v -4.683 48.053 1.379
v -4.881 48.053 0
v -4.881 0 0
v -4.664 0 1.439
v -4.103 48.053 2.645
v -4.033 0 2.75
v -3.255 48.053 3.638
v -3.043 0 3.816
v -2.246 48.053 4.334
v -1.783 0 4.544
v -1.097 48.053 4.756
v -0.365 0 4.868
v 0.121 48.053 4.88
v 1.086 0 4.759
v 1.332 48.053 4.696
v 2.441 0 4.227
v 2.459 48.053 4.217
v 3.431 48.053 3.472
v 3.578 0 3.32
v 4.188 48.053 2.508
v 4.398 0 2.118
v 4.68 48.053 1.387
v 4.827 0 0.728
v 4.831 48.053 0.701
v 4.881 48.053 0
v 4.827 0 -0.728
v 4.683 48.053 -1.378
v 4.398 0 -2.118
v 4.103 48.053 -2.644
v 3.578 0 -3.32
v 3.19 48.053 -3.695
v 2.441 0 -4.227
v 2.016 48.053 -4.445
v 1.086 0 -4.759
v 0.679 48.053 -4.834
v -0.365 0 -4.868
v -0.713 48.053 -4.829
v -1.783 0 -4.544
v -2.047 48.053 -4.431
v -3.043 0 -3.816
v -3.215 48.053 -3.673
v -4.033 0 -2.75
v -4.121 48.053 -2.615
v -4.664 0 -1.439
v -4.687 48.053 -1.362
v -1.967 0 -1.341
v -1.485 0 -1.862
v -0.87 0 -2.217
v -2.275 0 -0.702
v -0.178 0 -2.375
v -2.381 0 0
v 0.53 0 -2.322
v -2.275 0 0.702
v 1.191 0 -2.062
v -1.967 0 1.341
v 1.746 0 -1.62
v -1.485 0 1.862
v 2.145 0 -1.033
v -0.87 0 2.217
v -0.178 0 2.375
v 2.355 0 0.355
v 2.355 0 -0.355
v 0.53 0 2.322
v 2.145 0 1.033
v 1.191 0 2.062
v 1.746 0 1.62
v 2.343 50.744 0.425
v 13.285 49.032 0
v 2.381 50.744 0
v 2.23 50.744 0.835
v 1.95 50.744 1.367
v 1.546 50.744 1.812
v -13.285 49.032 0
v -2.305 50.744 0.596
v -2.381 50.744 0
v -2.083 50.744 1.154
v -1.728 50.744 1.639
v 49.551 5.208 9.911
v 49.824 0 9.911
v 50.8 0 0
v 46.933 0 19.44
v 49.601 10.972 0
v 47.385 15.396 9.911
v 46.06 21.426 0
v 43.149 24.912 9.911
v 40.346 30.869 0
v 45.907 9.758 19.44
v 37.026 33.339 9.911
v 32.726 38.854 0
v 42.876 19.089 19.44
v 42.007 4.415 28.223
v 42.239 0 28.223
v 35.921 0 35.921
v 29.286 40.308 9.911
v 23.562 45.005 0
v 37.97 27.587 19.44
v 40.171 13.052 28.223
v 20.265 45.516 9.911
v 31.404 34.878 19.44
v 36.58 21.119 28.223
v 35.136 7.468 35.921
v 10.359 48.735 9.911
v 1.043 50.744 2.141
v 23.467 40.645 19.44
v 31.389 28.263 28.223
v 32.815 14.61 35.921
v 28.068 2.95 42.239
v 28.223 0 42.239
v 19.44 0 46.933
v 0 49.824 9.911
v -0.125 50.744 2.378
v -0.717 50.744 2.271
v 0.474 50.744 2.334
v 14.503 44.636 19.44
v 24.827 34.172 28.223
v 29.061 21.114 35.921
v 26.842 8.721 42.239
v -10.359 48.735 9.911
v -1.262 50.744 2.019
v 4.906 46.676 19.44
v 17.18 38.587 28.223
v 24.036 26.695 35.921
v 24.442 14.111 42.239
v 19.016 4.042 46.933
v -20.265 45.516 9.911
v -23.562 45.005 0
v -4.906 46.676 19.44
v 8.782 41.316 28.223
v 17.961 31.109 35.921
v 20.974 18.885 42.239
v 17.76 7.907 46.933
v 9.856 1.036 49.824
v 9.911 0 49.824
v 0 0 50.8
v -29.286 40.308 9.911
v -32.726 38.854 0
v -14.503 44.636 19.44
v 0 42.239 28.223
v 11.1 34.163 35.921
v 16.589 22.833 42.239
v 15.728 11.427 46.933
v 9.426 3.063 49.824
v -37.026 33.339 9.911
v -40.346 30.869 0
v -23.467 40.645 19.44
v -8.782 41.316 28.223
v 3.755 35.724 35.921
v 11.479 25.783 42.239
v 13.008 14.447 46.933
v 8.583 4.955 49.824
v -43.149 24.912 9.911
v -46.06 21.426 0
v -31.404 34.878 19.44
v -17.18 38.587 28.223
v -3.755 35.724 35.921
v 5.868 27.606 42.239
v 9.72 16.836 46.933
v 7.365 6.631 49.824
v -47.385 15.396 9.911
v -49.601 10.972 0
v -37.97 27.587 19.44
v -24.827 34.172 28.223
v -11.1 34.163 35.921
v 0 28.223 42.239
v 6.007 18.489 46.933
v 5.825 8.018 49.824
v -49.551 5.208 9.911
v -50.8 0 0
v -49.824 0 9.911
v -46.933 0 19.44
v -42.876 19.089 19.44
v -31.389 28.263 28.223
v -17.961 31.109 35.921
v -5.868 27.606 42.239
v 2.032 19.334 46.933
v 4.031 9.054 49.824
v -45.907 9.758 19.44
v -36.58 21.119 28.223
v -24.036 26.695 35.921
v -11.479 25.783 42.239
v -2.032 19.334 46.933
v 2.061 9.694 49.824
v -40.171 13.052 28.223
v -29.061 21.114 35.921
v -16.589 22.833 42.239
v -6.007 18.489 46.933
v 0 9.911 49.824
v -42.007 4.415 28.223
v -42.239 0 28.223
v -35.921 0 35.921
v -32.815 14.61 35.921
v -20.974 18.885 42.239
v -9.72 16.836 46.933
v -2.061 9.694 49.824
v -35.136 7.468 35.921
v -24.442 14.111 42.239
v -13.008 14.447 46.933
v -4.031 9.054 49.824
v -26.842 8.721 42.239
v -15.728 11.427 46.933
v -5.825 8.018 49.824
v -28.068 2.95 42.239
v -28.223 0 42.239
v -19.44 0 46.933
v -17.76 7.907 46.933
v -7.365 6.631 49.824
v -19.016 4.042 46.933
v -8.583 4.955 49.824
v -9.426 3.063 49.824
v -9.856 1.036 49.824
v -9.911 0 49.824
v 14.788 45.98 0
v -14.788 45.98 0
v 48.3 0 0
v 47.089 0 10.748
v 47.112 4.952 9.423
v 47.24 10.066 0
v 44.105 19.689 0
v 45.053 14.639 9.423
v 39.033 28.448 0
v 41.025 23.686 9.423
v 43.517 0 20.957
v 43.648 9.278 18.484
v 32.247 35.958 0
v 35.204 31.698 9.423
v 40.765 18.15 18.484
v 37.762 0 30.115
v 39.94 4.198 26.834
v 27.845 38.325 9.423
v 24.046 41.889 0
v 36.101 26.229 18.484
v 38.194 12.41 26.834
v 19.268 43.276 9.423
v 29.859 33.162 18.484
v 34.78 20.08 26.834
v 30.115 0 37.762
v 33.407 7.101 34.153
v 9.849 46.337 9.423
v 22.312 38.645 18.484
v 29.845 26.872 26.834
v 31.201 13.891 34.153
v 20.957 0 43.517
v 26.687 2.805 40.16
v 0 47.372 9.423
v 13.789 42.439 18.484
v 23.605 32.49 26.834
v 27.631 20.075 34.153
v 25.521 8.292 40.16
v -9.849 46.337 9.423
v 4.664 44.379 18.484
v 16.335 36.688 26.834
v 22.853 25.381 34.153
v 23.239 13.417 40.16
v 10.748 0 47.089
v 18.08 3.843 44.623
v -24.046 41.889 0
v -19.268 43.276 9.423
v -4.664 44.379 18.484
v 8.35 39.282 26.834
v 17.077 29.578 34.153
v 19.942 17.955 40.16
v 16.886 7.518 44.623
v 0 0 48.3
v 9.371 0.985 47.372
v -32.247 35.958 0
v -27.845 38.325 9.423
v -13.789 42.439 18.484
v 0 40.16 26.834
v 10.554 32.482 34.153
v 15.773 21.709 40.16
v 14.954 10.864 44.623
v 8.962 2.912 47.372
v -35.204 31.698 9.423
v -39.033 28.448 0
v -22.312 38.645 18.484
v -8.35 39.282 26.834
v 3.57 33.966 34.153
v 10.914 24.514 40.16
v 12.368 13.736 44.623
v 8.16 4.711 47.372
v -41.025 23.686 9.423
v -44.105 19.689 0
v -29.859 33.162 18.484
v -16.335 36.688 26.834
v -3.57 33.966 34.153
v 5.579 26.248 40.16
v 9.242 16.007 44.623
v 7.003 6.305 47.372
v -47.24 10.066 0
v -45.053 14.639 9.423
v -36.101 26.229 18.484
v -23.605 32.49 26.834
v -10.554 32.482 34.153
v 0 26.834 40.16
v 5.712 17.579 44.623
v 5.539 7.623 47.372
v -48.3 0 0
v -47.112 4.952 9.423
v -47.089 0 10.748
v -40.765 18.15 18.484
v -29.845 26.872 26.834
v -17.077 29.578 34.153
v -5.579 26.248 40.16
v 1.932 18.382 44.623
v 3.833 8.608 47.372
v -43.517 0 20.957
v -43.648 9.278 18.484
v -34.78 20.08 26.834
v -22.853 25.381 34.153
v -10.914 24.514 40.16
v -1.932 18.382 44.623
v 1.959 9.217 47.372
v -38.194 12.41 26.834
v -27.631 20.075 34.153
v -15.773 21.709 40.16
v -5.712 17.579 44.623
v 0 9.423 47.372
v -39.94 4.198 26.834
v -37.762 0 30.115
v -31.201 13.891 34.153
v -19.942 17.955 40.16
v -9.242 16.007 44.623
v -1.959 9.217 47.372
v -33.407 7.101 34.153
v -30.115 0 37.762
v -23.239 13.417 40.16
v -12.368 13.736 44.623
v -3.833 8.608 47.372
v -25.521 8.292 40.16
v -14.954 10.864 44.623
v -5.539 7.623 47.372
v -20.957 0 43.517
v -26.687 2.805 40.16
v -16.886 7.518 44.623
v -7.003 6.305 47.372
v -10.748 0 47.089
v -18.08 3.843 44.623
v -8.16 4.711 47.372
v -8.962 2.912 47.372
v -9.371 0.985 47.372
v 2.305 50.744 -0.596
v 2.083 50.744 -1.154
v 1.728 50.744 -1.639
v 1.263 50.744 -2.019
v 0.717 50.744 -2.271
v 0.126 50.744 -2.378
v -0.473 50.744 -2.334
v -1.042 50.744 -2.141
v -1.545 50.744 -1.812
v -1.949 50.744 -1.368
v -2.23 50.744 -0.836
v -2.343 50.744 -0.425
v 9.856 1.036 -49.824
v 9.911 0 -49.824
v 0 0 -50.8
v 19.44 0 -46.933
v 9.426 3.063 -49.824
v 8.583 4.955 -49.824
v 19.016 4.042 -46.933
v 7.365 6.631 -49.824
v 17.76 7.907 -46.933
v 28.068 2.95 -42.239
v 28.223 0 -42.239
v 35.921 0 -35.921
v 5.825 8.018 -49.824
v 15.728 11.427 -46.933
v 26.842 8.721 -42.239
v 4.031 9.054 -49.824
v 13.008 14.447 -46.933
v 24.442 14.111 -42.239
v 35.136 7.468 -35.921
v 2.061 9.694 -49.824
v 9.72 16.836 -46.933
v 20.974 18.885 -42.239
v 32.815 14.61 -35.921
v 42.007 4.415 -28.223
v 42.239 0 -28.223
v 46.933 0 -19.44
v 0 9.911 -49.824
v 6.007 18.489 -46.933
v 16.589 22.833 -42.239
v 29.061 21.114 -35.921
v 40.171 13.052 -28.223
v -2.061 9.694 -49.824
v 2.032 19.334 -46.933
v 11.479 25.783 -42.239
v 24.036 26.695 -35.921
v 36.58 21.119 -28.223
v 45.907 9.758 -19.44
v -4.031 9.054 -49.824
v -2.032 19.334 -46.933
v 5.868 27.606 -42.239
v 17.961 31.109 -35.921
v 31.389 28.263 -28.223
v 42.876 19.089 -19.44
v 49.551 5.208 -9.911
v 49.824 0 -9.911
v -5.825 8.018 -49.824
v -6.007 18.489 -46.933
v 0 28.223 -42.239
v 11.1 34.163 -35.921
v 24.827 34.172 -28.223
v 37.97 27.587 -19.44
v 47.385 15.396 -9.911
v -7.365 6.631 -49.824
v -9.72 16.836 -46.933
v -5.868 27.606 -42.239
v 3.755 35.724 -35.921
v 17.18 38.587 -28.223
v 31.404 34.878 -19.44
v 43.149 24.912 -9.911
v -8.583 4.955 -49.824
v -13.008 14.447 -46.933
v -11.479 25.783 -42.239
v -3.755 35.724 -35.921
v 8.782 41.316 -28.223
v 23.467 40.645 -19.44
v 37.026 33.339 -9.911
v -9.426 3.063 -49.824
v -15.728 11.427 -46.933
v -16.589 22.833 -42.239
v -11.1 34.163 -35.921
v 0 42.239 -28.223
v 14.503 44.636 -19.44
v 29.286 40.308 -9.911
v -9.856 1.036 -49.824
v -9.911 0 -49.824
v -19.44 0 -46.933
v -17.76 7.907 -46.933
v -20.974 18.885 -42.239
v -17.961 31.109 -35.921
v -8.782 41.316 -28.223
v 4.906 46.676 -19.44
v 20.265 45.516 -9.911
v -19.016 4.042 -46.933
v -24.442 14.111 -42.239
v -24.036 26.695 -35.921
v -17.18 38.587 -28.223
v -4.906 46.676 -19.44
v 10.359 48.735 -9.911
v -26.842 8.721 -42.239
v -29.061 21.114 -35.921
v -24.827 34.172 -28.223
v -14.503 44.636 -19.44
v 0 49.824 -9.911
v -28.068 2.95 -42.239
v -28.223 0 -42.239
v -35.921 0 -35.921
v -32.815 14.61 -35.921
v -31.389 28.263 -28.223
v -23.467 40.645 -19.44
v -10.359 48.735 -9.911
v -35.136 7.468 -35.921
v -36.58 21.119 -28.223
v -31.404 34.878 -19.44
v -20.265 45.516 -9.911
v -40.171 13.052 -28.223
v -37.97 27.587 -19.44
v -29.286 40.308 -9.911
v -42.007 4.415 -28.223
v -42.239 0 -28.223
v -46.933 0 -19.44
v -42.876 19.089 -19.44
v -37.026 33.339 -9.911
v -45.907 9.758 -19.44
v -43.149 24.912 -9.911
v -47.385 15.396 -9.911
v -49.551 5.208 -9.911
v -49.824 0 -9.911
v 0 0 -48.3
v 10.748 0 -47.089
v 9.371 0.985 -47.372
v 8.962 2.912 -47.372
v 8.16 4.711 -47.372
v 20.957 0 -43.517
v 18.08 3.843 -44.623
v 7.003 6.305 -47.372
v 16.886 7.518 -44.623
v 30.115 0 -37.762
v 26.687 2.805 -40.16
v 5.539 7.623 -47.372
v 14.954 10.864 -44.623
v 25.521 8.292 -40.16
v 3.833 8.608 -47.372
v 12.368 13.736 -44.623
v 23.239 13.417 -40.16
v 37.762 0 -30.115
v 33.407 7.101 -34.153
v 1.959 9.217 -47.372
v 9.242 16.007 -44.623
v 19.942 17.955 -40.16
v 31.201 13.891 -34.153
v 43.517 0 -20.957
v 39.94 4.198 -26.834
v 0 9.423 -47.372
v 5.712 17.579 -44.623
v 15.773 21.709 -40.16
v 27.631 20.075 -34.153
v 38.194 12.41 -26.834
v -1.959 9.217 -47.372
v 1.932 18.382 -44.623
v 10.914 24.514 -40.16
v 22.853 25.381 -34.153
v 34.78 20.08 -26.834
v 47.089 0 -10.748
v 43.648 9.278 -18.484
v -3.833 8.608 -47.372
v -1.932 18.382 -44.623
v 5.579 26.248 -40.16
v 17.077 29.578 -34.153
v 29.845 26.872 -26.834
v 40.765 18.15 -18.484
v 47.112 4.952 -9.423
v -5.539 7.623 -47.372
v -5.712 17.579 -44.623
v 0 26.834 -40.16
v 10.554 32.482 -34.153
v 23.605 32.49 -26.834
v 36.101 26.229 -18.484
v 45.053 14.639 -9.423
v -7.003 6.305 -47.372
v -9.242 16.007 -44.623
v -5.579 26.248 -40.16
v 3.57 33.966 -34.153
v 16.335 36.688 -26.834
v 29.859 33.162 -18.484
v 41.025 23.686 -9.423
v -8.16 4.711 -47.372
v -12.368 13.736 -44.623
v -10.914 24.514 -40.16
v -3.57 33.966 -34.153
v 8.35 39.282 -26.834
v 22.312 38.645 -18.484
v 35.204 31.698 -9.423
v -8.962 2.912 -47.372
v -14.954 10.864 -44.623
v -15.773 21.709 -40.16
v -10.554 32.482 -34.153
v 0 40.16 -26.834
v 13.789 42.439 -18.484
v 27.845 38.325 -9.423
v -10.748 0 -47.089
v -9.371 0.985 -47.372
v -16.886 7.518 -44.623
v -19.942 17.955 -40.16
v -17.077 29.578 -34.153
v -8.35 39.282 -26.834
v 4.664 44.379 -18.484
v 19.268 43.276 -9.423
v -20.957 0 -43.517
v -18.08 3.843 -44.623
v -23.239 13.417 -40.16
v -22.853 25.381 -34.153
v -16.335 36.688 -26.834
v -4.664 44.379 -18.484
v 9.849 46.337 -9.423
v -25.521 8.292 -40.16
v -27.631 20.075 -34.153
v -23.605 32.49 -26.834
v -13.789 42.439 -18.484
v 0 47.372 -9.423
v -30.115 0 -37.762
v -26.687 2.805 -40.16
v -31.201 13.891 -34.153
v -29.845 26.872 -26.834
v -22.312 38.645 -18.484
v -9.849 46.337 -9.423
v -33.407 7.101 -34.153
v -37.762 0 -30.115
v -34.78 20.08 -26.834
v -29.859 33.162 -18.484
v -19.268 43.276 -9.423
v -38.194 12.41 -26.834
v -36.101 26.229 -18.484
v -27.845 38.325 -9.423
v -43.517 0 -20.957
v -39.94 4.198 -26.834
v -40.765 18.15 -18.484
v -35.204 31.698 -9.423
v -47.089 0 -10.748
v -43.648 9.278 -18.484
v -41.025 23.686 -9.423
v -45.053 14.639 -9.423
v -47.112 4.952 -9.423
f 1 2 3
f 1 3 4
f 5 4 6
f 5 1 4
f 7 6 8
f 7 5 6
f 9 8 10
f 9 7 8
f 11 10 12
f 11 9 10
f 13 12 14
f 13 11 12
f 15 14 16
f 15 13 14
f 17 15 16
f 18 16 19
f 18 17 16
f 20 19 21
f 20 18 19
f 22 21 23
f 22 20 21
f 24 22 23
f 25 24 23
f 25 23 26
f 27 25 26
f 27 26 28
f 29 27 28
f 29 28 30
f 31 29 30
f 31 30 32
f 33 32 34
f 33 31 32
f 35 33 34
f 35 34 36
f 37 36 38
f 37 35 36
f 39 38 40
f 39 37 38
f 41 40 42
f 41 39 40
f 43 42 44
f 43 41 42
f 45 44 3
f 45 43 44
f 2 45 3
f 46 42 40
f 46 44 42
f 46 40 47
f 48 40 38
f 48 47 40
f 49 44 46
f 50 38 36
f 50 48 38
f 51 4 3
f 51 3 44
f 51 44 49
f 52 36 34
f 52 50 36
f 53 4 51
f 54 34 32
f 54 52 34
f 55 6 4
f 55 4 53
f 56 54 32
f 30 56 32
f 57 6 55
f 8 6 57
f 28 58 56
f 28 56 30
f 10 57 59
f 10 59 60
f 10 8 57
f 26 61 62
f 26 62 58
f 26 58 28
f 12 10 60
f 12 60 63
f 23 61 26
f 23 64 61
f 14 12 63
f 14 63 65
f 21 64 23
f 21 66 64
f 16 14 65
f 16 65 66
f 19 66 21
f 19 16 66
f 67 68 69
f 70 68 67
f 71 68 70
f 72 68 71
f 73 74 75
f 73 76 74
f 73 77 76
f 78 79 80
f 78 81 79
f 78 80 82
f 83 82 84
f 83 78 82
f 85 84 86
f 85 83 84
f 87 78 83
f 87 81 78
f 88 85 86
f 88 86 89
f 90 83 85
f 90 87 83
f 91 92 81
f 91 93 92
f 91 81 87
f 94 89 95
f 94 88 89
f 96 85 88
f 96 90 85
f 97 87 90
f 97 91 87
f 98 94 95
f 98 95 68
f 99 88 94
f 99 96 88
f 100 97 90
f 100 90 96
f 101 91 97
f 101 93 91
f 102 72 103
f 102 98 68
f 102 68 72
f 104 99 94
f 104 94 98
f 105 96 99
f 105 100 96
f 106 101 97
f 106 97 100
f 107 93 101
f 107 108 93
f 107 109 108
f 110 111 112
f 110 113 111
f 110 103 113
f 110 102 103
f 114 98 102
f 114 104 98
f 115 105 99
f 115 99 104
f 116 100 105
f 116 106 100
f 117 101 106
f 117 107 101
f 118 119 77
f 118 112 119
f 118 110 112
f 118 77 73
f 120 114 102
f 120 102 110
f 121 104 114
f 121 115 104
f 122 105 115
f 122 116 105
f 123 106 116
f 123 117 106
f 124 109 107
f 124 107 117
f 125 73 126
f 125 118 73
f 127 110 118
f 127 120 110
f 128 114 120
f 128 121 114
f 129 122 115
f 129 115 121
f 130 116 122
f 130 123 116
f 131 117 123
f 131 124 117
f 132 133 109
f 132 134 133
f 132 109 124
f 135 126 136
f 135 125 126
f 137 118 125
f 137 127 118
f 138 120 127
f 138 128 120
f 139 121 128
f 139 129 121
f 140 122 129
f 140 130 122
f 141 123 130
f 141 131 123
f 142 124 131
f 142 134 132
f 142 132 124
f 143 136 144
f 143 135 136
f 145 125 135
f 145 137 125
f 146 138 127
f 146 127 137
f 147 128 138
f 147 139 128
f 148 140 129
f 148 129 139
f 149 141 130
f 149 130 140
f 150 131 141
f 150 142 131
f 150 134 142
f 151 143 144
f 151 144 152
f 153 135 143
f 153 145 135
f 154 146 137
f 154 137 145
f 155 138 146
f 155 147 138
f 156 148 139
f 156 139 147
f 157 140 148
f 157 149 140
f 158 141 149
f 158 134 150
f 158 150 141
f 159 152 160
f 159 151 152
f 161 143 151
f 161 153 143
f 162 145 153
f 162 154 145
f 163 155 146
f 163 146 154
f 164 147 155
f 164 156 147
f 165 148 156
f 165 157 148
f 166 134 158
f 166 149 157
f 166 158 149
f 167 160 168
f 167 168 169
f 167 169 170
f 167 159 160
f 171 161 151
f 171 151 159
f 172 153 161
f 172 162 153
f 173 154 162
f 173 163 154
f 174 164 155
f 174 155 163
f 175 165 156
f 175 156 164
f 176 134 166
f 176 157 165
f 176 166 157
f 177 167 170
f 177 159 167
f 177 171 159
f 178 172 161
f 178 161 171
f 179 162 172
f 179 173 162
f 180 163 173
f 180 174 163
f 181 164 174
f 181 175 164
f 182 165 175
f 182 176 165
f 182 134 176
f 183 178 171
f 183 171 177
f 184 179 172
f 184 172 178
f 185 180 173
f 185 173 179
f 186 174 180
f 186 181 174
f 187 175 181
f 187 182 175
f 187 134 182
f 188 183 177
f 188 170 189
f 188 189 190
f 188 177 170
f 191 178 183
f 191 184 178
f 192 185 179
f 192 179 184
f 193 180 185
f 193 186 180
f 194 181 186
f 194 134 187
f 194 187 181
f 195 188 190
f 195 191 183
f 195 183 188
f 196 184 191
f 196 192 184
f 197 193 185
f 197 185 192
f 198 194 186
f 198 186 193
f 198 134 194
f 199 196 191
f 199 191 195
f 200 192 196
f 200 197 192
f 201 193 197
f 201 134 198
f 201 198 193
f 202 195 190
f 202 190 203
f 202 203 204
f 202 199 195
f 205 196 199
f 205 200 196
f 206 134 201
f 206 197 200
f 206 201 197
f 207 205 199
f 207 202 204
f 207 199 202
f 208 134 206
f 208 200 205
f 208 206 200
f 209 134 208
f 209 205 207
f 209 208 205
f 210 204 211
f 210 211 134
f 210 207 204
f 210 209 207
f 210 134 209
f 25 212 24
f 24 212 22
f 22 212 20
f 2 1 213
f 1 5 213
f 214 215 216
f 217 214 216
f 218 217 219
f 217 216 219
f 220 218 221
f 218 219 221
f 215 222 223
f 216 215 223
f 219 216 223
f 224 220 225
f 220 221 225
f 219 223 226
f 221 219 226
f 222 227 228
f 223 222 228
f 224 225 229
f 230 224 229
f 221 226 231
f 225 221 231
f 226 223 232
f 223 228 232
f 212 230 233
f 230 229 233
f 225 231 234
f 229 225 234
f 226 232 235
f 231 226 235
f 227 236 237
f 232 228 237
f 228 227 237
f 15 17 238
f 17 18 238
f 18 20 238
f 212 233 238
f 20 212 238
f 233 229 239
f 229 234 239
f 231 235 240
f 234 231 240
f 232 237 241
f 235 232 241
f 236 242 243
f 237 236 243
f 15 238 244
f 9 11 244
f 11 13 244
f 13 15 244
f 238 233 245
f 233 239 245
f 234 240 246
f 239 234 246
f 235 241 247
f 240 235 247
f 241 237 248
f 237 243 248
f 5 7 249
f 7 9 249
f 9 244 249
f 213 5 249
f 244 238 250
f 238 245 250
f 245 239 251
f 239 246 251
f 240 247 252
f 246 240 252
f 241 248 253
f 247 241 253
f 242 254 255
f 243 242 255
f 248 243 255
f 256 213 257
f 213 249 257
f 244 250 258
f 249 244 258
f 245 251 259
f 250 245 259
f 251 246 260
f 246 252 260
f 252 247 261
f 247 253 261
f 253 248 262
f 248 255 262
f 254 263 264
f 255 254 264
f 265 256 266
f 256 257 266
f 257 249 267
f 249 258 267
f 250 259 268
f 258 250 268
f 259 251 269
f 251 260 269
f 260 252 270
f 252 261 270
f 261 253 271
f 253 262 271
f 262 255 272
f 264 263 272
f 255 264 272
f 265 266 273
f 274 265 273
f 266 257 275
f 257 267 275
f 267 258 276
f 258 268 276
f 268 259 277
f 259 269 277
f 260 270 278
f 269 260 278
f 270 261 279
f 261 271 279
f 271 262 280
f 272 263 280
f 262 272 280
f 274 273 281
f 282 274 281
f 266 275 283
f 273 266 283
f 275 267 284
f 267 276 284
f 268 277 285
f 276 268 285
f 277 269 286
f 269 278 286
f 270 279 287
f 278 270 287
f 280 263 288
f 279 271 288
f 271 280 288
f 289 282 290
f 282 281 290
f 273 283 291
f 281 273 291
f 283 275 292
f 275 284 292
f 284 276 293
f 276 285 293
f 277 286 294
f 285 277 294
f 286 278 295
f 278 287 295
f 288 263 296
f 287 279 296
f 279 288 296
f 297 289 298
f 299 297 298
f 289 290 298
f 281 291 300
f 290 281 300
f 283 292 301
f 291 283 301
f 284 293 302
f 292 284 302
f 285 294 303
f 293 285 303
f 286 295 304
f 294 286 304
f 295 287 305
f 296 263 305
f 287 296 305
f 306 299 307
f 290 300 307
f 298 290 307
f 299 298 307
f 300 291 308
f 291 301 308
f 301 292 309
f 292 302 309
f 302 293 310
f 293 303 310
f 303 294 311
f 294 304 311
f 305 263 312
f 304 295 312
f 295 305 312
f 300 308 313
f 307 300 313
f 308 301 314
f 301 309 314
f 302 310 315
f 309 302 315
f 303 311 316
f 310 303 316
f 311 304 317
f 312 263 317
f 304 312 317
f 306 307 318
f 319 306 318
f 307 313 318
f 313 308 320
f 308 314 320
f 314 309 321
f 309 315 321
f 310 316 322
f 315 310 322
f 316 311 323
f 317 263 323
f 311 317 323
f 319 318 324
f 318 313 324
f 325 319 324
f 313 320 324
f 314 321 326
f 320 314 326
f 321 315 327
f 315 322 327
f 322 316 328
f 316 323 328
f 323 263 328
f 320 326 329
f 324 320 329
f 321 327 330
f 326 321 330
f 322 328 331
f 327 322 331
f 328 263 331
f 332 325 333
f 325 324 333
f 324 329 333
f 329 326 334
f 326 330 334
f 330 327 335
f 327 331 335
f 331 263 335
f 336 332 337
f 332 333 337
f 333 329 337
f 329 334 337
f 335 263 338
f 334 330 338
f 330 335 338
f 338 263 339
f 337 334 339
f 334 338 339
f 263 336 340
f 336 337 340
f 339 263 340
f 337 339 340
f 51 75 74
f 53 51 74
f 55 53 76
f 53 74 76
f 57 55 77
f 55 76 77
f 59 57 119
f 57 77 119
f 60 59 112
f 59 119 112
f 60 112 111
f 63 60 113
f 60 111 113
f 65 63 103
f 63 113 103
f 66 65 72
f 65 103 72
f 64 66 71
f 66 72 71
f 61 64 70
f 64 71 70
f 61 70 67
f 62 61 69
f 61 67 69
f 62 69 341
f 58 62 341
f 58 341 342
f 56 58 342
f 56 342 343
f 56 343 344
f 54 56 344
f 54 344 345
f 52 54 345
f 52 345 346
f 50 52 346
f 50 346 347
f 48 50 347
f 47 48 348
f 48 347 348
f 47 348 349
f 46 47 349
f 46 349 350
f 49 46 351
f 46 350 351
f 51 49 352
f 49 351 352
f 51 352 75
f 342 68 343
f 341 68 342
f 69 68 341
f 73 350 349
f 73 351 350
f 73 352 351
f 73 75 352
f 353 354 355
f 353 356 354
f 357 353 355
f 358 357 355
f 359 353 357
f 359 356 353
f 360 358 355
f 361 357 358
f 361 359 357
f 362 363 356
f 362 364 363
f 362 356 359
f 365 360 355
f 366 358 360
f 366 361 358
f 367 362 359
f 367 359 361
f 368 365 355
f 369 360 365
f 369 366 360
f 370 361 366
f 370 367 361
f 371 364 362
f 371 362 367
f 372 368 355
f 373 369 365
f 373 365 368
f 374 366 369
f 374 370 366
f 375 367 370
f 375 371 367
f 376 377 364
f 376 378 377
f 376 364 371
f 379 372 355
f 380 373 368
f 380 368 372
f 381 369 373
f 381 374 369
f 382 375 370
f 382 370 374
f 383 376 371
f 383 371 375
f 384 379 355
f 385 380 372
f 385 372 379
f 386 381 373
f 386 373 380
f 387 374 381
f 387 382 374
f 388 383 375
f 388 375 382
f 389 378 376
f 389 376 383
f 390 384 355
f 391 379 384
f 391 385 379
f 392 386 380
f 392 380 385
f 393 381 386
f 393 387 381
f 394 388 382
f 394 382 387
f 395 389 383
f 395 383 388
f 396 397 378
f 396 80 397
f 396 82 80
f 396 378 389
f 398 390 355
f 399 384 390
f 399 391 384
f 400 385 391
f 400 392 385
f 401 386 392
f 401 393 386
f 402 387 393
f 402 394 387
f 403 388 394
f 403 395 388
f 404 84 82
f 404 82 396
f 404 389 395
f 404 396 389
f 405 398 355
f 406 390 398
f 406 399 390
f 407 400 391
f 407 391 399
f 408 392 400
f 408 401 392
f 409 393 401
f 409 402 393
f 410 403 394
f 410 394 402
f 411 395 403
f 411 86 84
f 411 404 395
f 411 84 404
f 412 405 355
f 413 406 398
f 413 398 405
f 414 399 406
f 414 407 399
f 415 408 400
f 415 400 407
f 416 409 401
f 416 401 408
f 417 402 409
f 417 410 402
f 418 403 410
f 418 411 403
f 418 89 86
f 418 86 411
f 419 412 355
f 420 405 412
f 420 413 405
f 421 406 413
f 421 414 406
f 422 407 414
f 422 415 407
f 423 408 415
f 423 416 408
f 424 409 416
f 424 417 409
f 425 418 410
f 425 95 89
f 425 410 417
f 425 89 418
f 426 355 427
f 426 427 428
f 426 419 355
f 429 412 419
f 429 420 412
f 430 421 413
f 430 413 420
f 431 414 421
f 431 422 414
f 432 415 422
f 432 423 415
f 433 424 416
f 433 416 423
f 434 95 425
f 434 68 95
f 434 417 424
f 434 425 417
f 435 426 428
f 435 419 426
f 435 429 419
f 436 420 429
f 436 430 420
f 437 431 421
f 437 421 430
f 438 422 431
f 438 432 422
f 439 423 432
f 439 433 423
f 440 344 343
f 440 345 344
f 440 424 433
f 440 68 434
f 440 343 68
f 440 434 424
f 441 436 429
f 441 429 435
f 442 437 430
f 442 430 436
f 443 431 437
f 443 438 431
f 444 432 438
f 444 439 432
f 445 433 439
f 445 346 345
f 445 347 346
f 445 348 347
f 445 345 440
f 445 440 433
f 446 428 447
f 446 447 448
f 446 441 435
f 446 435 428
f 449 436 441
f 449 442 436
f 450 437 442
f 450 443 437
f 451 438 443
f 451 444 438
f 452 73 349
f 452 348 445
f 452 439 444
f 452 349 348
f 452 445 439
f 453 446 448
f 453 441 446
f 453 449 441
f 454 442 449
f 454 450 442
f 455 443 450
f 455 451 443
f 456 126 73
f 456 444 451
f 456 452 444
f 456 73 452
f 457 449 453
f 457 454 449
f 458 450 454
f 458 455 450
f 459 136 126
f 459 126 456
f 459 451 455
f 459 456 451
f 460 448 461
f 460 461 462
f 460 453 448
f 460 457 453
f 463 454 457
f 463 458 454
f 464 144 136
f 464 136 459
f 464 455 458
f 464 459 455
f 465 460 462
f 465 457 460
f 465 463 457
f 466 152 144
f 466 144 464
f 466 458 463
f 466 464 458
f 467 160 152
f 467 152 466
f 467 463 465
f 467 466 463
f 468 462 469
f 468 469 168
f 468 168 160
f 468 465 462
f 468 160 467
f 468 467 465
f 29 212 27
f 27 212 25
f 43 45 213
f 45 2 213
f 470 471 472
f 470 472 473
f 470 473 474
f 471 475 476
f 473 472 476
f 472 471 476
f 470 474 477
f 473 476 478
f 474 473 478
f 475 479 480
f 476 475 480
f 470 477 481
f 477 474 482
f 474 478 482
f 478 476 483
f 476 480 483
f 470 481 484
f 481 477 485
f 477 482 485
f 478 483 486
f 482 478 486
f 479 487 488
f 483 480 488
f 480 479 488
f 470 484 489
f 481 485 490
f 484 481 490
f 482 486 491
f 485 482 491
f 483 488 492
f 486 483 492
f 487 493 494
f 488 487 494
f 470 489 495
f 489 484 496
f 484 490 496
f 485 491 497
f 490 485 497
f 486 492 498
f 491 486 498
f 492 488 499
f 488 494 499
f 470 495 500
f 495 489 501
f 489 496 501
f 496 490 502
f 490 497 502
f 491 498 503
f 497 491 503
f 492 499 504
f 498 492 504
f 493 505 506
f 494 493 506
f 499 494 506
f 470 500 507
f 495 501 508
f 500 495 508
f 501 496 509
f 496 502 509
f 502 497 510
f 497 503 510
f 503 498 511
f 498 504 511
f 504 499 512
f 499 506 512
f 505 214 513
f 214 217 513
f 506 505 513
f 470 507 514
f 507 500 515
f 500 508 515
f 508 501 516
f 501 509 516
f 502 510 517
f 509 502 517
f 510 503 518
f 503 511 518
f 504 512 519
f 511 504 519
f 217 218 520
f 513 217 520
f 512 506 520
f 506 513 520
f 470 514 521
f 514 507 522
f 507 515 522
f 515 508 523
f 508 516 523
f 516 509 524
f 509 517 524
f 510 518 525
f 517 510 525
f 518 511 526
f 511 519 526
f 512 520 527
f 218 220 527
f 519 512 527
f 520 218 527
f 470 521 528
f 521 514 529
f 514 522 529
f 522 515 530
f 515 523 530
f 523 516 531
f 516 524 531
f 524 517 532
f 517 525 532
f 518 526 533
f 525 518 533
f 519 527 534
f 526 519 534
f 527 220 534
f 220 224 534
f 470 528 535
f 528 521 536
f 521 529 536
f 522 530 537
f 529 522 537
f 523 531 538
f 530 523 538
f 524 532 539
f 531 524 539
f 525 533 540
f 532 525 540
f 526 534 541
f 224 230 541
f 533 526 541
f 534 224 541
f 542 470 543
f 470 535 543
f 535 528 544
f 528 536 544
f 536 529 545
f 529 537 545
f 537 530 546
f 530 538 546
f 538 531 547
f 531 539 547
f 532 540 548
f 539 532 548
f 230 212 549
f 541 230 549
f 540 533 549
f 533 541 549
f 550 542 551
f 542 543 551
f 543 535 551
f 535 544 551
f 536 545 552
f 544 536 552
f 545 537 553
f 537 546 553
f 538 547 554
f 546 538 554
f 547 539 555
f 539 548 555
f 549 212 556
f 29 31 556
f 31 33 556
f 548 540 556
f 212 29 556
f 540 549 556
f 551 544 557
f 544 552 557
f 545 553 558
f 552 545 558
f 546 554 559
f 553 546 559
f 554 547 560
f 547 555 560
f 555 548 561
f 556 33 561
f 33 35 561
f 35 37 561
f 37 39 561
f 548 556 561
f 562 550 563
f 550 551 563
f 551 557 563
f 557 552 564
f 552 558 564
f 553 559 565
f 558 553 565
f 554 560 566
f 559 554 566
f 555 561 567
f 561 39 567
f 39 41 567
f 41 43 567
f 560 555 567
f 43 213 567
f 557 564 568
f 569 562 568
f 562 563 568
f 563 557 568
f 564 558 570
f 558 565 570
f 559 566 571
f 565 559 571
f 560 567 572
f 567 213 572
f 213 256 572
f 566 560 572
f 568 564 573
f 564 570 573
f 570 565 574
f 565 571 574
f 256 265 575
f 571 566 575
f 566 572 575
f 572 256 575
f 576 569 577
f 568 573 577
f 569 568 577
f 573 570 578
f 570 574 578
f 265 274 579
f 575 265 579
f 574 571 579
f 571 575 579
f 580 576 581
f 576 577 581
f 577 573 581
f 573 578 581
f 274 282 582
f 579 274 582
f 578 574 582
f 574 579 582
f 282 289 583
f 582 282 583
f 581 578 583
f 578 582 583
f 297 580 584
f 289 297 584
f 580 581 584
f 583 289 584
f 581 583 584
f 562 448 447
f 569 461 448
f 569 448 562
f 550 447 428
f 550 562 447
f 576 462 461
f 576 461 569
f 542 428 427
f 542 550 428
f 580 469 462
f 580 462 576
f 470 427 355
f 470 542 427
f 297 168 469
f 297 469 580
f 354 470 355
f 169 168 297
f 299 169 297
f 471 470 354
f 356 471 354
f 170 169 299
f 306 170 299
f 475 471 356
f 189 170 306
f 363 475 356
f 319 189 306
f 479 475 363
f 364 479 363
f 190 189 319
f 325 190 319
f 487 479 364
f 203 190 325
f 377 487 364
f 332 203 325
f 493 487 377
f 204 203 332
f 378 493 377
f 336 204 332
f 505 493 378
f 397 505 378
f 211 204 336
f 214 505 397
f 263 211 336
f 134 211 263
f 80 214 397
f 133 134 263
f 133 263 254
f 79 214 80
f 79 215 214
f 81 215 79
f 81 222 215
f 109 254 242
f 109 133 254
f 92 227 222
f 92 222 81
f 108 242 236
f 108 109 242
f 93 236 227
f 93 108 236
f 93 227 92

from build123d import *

# Parameters (mm, degrees)
F1_ANGLE = 180
F2_D     = 4.7625
F4_T     = -2.5


# Not quite as in the source:
# - a feature of the source that left no trace in its solid (it failed there, or was rolled back) is left out


with BuildPart() as f1:
    # F0 (on Front) → F1 (revolve)
    with BuildSketch(Plane.XZ):
        with BuildLine():
            ThreePointArc((0, -50.8), (35.9210244843, -35.9210244843), (50.8, 0))
            ThreePointArc((50.8, 0), (35.9210244843, 35.9210244843), (0, 50.8))
            Line((0, 50.8), (0, 0))
            Line((0, 0), (0, -50.8))
        make_face()
    revolve(axis=Axis((0, 0, 25.4), (0, 0, 1)), revolution_arc=F1_ANGLE)

    # F2 (through all)
    with Locations(Plane.XZ):
        with Locations((0, 0)):
            Hole(F2_D / 2)

    # F4
    f4_openings = [f1.faces().sort_by_distance(p)[0] for p in [
        (49.363159, 0, 0),
    ]]
    offset(amount=F4_T, openings=f4_openings)


solid = f1.part
